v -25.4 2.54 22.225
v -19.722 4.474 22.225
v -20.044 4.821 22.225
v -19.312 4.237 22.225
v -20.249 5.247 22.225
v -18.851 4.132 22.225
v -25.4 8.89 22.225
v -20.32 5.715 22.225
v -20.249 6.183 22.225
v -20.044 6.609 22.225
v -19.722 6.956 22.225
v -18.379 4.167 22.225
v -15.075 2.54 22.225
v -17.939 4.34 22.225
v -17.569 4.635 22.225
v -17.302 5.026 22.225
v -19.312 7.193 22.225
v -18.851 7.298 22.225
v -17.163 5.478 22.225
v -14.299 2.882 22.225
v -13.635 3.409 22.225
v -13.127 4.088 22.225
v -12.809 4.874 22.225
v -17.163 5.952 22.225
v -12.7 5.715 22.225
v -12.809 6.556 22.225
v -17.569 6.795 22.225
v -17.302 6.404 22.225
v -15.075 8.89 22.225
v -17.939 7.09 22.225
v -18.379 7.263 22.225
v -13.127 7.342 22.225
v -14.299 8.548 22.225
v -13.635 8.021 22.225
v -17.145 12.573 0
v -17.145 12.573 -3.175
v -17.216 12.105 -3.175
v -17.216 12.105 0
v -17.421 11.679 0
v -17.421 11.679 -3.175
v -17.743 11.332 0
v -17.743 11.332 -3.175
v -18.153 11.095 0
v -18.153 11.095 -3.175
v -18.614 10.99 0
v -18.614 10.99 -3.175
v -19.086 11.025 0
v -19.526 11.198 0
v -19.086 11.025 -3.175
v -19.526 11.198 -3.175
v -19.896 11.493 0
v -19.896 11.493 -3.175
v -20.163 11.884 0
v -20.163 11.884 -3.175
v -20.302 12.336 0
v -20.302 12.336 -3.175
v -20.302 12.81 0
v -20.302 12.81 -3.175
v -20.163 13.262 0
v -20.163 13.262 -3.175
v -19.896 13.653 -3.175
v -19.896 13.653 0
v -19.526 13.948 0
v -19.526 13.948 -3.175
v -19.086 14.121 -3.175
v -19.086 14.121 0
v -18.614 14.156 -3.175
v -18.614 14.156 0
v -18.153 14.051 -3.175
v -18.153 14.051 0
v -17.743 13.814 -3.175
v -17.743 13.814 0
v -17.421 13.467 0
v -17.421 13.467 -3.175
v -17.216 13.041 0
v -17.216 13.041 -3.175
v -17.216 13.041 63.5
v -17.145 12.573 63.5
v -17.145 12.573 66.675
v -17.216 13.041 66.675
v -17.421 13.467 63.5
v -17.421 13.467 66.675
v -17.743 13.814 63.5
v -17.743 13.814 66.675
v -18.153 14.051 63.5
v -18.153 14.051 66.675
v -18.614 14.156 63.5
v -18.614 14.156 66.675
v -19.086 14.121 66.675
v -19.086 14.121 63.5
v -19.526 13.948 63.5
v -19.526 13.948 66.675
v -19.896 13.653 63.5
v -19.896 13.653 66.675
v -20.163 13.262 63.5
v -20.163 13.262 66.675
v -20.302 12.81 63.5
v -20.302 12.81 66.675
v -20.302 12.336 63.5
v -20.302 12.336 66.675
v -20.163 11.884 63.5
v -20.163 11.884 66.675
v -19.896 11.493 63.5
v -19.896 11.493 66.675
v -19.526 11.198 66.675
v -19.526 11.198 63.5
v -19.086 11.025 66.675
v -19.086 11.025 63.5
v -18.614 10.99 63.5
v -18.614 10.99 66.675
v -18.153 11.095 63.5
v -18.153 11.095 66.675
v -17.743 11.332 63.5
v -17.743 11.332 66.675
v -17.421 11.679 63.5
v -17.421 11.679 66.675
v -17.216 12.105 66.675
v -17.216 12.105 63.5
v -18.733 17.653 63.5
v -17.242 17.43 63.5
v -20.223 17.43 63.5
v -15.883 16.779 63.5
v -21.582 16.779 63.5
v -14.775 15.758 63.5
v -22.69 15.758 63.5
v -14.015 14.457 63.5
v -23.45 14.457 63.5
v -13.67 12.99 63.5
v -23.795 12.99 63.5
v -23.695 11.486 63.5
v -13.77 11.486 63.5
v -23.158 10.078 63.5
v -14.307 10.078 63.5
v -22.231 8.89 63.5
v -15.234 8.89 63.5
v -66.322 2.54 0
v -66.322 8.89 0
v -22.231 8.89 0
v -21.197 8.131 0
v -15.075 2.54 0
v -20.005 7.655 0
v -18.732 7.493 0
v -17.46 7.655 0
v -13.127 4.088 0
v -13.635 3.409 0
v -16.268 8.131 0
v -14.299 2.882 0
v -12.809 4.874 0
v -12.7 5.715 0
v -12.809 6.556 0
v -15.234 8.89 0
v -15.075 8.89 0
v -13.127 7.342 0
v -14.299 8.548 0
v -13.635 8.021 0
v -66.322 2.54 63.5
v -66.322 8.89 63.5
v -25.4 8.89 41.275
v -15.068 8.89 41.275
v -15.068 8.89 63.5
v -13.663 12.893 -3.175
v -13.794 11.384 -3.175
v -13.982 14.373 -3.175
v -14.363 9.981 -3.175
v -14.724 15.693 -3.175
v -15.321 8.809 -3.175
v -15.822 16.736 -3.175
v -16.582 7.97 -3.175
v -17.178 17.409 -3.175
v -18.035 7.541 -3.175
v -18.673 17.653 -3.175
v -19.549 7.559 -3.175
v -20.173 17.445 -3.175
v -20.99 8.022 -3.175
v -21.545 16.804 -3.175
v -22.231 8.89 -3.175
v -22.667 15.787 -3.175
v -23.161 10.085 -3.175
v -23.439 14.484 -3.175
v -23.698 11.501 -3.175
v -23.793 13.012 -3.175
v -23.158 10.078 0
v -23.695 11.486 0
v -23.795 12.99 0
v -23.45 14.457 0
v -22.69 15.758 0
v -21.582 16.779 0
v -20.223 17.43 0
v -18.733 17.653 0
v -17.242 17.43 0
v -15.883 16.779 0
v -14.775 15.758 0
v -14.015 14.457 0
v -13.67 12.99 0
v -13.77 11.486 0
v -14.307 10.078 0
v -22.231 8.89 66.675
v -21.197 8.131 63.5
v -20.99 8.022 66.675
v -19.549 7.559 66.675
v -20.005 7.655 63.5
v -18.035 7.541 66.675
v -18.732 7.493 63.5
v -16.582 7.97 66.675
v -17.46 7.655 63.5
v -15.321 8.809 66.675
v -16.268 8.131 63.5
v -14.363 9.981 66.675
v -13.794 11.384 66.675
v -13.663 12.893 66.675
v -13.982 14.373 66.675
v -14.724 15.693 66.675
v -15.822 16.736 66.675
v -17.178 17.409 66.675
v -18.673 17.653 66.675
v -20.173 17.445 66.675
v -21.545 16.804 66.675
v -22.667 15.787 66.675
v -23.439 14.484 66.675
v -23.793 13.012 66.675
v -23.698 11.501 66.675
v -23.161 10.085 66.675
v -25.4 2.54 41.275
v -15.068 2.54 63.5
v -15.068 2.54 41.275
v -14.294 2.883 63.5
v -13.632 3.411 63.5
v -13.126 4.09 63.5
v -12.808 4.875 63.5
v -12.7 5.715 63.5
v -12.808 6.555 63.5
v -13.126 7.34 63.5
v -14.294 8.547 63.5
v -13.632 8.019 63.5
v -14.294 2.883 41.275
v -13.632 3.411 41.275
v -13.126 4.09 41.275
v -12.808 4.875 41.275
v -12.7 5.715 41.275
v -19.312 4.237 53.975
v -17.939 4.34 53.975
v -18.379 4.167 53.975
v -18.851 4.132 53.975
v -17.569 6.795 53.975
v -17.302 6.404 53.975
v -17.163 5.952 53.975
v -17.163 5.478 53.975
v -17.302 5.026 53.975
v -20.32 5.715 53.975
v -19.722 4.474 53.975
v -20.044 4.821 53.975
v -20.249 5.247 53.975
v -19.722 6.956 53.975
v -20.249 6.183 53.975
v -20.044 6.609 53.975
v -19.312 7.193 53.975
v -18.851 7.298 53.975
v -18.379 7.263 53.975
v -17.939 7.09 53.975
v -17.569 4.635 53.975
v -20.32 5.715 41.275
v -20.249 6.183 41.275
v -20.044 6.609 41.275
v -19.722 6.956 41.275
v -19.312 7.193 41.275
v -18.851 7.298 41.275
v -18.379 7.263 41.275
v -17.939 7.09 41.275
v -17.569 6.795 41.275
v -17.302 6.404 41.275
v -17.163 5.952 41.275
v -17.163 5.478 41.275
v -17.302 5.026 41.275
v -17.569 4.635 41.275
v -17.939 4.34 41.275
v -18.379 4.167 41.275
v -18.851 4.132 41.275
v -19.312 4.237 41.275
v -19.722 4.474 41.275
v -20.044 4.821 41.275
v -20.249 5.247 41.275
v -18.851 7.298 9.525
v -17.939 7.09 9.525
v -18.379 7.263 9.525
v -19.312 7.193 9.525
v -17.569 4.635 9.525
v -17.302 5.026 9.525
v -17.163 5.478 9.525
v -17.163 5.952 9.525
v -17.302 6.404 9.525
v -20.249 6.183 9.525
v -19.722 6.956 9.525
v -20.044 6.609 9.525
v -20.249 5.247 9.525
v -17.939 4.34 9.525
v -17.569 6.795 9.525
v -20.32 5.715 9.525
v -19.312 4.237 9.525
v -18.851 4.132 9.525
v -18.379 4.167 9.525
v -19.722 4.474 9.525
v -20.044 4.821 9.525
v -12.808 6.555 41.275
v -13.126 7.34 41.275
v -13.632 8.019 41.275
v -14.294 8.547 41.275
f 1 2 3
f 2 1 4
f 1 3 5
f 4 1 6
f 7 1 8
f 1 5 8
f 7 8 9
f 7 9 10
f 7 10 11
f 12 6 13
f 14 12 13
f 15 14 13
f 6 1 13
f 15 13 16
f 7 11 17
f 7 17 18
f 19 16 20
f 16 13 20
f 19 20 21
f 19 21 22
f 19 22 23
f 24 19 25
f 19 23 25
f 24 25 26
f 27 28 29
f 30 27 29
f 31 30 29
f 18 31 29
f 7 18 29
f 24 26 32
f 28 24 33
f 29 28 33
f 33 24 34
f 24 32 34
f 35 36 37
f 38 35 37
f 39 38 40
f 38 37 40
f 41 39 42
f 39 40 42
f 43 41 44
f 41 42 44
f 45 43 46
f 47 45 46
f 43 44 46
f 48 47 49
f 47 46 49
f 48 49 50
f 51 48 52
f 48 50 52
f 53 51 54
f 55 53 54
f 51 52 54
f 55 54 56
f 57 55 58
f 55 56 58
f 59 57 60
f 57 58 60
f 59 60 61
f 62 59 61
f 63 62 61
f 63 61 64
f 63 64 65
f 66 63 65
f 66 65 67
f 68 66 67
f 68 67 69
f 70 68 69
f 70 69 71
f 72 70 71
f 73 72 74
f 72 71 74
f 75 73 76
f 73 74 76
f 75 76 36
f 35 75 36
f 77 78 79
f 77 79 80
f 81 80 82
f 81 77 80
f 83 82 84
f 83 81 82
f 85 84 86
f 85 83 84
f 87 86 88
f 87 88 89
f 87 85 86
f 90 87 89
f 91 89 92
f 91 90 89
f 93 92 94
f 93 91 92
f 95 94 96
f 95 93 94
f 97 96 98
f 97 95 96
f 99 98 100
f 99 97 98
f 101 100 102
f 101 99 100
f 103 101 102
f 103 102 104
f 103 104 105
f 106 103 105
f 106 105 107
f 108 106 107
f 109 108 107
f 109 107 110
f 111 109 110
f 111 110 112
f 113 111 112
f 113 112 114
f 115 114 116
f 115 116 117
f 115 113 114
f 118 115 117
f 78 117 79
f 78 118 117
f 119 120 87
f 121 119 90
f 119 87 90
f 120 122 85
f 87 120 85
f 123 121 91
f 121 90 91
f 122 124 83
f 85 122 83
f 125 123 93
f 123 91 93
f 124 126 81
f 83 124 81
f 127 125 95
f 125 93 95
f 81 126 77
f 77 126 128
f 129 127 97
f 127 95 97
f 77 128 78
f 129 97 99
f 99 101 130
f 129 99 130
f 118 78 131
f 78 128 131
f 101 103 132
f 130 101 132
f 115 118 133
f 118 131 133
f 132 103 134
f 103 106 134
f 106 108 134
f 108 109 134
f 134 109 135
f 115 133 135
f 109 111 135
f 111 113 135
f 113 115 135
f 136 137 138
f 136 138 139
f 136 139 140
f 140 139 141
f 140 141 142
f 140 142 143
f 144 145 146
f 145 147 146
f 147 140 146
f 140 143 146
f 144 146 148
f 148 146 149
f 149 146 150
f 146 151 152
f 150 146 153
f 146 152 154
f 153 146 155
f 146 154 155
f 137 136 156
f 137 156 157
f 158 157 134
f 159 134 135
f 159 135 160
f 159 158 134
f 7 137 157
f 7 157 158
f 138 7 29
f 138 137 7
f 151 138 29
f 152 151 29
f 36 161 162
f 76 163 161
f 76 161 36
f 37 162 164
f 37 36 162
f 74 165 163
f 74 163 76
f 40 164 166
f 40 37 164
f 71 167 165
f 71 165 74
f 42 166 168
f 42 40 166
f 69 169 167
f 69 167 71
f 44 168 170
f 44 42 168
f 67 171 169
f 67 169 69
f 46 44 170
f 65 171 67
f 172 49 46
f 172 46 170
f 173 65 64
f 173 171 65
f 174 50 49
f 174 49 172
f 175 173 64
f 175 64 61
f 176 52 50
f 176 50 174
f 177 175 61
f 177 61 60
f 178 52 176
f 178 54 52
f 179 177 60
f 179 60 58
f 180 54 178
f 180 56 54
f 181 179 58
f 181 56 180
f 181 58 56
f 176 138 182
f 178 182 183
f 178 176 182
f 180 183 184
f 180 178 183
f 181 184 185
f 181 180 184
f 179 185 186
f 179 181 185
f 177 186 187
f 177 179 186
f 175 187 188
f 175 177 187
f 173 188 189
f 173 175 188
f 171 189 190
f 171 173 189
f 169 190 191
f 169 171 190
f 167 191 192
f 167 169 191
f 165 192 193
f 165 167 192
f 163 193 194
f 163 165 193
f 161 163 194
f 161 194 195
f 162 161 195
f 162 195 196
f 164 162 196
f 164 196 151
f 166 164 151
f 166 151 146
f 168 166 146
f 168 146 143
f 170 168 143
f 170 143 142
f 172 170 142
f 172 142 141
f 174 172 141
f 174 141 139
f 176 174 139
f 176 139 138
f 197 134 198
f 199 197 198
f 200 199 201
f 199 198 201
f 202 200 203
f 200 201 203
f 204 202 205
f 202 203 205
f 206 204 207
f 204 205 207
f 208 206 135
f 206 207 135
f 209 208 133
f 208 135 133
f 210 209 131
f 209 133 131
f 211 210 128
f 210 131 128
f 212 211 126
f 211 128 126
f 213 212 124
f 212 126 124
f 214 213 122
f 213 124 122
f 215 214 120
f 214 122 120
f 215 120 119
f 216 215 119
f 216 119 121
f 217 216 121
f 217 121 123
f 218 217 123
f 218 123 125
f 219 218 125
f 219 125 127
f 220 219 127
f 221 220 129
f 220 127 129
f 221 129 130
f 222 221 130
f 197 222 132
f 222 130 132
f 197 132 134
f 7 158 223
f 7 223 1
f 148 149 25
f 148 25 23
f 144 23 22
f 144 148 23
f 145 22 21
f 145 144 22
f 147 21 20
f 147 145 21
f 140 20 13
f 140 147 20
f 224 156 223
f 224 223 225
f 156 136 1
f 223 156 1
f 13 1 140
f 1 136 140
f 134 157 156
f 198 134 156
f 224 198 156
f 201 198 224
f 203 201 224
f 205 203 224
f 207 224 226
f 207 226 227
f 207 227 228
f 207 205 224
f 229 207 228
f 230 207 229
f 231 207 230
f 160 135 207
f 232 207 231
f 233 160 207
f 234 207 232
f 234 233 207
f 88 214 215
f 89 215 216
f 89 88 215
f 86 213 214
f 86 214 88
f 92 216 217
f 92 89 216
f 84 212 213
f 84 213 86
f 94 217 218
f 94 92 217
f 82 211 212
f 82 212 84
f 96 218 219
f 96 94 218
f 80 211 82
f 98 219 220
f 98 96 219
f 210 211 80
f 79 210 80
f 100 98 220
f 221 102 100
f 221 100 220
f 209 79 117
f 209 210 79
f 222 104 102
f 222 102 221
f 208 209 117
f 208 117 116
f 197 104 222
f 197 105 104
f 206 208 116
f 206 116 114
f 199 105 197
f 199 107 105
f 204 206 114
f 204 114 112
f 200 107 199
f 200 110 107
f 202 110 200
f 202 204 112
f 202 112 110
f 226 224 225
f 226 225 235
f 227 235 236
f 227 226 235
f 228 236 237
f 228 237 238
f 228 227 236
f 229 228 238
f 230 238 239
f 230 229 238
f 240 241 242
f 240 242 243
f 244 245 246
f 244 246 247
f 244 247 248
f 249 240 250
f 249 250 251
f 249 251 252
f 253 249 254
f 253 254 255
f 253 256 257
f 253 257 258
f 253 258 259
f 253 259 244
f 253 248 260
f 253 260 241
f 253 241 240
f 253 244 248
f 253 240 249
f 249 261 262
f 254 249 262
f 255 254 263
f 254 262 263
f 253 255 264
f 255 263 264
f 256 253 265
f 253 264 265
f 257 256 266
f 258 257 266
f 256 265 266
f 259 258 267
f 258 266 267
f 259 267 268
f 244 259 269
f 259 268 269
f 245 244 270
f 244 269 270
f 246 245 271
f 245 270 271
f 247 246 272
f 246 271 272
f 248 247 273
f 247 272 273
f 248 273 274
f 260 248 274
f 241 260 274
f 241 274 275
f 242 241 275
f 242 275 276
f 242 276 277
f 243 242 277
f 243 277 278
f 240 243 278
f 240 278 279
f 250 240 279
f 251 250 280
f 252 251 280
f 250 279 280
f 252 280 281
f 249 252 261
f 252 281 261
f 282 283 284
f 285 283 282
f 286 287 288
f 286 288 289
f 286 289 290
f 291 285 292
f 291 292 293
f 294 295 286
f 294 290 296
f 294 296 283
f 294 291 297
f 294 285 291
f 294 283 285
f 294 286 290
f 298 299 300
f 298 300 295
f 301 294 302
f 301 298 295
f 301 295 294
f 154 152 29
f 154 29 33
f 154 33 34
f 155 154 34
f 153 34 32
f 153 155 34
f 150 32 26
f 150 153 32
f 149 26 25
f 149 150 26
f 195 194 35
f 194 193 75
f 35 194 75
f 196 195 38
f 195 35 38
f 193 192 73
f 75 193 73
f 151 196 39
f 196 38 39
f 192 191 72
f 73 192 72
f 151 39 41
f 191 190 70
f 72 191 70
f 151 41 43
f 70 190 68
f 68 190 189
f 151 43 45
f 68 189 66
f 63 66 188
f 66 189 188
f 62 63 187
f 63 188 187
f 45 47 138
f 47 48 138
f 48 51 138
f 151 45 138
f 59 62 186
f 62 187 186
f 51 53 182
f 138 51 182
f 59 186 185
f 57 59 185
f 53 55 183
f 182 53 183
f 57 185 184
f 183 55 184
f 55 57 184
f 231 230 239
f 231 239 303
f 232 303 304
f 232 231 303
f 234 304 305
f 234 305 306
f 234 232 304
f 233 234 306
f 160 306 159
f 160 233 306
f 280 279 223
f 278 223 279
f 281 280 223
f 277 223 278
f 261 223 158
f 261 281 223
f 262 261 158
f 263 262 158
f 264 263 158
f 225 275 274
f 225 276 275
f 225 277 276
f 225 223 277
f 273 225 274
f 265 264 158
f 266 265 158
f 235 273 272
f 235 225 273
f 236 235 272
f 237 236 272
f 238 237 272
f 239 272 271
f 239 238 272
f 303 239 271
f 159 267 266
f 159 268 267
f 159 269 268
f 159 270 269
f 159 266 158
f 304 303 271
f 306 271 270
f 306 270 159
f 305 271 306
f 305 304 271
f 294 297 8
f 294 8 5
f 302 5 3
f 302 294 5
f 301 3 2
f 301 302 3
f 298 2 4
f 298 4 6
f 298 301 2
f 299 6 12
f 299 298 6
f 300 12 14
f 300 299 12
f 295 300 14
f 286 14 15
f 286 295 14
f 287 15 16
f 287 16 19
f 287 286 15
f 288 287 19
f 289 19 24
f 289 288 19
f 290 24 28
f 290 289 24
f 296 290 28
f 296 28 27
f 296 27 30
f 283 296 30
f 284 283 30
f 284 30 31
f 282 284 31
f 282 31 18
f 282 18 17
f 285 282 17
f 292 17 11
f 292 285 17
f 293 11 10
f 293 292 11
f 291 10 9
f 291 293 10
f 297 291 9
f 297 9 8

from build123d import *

# Parameters (mm, degrees)
SKETCH1_W           = 66.321579053
SKETCH1_H           = 6.35
BOSS_EXTRUDE2_DEPTH = 63.5
SKETCH2_W           = 19.05
SKETCH2_H           = 6.35
CUT_EXTRUDE1_DEPTH  = 25.4
SKETCH3_R           = 1.5875
CUT_EXTRUDE2_DEPTH  = 12.7
CUT_EXTRUDE3_START  = -12.7
SKETCH4_R           = 1.5875
CUT_EXTRUDE3_DEPTH  = 12.7
SKETCH5_R           = 5.08
SKETCH5_R_2         = 1.5875
BOSS_EXTRUDE3_DEPTH = 3.175
BOSS_EXTRUDE4_START = 3.175
SKETCH6_R           = 5.08
SKETCH6_R_2         = 1.5875
BOSS_EXTRUDE4_DEPTH = 3.175
SKETCH7_W           = 12.7
SKETCH7_H           = 22.225
CUT_EXTRUDE4_DEPTH  = 6.35
CUT_EXTRUDE5_START  = -22.225
CUT_EXTRUDE5_DEPTH  = 22.225
CUT_EXTRUDE8_START  = -22.225
CUT_EXTRUDE8_DEPTH  = 22.225


# Read off the part's stored shape, not the designer's step: Cut-Extrude5, Cut-Extrude8
with BuildPart() as part:
    # Sketch1 → Boss-Extrude2 (new body)
    with BuildSketch(Plane.XY):
        with Locations((-33.160789527, 5.715)):
            Rectangle(SKETCH1_W, SKETCH1_H)
    extrude(amount=BOSS_EXTRUDE2_DEPTH)

    # Sketch2 → Cut-Extrude1 (cut)
    with BuildSketch(Plane(origin=(0, 0, 0), x_dir=(0, 0, -1), z_dir=(1, 0, 0))):
        with Locations((-31.75, 5.715)):
            Rectangle(SKETCH2_W, SKETCH2_H)
    extrude(amount=-CUT_EXTRUDE1_DEPTH, mode=Mode.SUBTRACT)

    # Sketch3 → Cut-Extrude2 (cut)
    with BuildSketch(Plane(origin=(0, 0, 41.275), x_dir=(-1, 0, 0), z_dir=(0, 0, -1))):
        with Locations((18.7325, 5.715)):
            Circle(SKETCH3_R)
    extrude(amount=-CUT_EXTRUDE2_DEPTH, mode=Mode.SUBTRACT)

    # Sketch4 → Cut-Extrude3 (cut)
    with BuildSketch(Plane.XY.offset(22.225).offset(CUT_EXTRUDE3_START)):
        with Locations(Location((-18.7325, 5.715, 0), (0, 0, 180))):
            Circle(SKETCH4_R)
    extrude(amount=CUT_EXTRUDE3_DEPTH, mode=Mode.SUBTRACT)

    # Sketch5 → Boss-Extrude3 (add)
    with BuildSketch(Plane.XY.offset(63.5)):
        with Locations(Location((-18.7325, 12.573, 0), (0, 0, 226.468847833))):
            Circle(SKETCH5_R)
        with Locations((-18.7325, 12.573)):
            Circle(SKETCH5_R_2, mode=Mode.SUBTRACT)
    extrude(amount=BOSS_EXTRUDE3_DEPTH)

    # Sketch6 → Boss-Extrude4 (add)
    with BuildSketch(Plane(origin=(0, 0, 0), x_dir=(-1, 0, 0), z_dir=(0, 0, -1)).offset(BOSS_EXTRUDE4_START)):
        with Locations(Location((18.7325, 12.573, 0), (0, 0, 313.531152167))):
            Circle(SKETCH6_R)
        with Locations(Location((18.7325, 12.573, 0), (0, 0, 180))):
            Circle(SKETCH6_R_2, mode=Mode.SUBTRACT)
    extrude(amount=-BOSS_EXTRUDE4_DEPTH)

    # Sketch7 → Cut-Extrude4 (cut)
    with BuildSketch(Plane(origin=(0, 8.89, 0), x_dir=(1, 0, 0), z_dir=(0, 1, 0))):
        with Locations((-6.35, -11.1125)):
            Rectangle(SKETCH7_W, SKETCH7_H)
        with Locations((-6.35, -52.3875)):
            Rectangle(SKETCH7_W, SKETCH7_H)
    extrude(amount=-CUT_EXTRUDE4_DEPTH, mode=Mode.SUBTRACT)

    # Cut-Extrude5 outline → Cut-Extrude5 (cut)
    with BuildSketch(Plane(origin=(0, 0, 41.275), x_dir=(-1, 0, 0), z_dir=(0, 0, -1)).offset(CUT_EXTRUDE5_START)):
        with BuildLine():
            Line((12.7, 2.54), (15.068097478, 2.54))
            ThreePointArc((15.068097478, 2.54), (13.357223916, 3.734563769), (12.7, 5.715))
            Line((12.7, 5.715), (12.7, 2.54))
        make_face()
        with BuildLine():
            Line((12.7, 8.89), (12.7, 5.715))
            ThreePointArc((12.7, 5.715), (13.357223916, 7.695436231), (15.068097478, 8.89))
            Line((15.068097478, 8.89), (12.7, 8.89))
        make_face()
    extrude(amount=CUT_EXTRUDE5_DEPTH, mode=Mode.SUBTRACT)

    # Cut-Extrude8 outline → Cut-Extrude8 (cut)
    with BuildSketch(Plane.XY.offset(22.225).offset(CUT_EXTRUDE8_START)):
        with BuildLine():
            Line((-12.7, 8.89), (-15.0749, 8.89))
            ThreePointArc((-15.0749, 8.89), (-13.359413065, 7.697471627), (-12.7, 5.715))
            Line((-12.7, 5.715), (-12.7, 8.89))
        make_face()
        with BuildLine():
            Line((-12.7, 2.54), (-12.7, 5.715))
            ThreePointArc((-12.7, 5.715), (-13.359413065, 3.732528373), (-15.0749, 2.54))
            Line((-15.0749, 2.54), (-12.7, 2.54))
        make_face()
    extrude(amount=CUT_EXTRUDE8_DEPTH, mode=Mode.SUBTRACT)


solid = part.part
